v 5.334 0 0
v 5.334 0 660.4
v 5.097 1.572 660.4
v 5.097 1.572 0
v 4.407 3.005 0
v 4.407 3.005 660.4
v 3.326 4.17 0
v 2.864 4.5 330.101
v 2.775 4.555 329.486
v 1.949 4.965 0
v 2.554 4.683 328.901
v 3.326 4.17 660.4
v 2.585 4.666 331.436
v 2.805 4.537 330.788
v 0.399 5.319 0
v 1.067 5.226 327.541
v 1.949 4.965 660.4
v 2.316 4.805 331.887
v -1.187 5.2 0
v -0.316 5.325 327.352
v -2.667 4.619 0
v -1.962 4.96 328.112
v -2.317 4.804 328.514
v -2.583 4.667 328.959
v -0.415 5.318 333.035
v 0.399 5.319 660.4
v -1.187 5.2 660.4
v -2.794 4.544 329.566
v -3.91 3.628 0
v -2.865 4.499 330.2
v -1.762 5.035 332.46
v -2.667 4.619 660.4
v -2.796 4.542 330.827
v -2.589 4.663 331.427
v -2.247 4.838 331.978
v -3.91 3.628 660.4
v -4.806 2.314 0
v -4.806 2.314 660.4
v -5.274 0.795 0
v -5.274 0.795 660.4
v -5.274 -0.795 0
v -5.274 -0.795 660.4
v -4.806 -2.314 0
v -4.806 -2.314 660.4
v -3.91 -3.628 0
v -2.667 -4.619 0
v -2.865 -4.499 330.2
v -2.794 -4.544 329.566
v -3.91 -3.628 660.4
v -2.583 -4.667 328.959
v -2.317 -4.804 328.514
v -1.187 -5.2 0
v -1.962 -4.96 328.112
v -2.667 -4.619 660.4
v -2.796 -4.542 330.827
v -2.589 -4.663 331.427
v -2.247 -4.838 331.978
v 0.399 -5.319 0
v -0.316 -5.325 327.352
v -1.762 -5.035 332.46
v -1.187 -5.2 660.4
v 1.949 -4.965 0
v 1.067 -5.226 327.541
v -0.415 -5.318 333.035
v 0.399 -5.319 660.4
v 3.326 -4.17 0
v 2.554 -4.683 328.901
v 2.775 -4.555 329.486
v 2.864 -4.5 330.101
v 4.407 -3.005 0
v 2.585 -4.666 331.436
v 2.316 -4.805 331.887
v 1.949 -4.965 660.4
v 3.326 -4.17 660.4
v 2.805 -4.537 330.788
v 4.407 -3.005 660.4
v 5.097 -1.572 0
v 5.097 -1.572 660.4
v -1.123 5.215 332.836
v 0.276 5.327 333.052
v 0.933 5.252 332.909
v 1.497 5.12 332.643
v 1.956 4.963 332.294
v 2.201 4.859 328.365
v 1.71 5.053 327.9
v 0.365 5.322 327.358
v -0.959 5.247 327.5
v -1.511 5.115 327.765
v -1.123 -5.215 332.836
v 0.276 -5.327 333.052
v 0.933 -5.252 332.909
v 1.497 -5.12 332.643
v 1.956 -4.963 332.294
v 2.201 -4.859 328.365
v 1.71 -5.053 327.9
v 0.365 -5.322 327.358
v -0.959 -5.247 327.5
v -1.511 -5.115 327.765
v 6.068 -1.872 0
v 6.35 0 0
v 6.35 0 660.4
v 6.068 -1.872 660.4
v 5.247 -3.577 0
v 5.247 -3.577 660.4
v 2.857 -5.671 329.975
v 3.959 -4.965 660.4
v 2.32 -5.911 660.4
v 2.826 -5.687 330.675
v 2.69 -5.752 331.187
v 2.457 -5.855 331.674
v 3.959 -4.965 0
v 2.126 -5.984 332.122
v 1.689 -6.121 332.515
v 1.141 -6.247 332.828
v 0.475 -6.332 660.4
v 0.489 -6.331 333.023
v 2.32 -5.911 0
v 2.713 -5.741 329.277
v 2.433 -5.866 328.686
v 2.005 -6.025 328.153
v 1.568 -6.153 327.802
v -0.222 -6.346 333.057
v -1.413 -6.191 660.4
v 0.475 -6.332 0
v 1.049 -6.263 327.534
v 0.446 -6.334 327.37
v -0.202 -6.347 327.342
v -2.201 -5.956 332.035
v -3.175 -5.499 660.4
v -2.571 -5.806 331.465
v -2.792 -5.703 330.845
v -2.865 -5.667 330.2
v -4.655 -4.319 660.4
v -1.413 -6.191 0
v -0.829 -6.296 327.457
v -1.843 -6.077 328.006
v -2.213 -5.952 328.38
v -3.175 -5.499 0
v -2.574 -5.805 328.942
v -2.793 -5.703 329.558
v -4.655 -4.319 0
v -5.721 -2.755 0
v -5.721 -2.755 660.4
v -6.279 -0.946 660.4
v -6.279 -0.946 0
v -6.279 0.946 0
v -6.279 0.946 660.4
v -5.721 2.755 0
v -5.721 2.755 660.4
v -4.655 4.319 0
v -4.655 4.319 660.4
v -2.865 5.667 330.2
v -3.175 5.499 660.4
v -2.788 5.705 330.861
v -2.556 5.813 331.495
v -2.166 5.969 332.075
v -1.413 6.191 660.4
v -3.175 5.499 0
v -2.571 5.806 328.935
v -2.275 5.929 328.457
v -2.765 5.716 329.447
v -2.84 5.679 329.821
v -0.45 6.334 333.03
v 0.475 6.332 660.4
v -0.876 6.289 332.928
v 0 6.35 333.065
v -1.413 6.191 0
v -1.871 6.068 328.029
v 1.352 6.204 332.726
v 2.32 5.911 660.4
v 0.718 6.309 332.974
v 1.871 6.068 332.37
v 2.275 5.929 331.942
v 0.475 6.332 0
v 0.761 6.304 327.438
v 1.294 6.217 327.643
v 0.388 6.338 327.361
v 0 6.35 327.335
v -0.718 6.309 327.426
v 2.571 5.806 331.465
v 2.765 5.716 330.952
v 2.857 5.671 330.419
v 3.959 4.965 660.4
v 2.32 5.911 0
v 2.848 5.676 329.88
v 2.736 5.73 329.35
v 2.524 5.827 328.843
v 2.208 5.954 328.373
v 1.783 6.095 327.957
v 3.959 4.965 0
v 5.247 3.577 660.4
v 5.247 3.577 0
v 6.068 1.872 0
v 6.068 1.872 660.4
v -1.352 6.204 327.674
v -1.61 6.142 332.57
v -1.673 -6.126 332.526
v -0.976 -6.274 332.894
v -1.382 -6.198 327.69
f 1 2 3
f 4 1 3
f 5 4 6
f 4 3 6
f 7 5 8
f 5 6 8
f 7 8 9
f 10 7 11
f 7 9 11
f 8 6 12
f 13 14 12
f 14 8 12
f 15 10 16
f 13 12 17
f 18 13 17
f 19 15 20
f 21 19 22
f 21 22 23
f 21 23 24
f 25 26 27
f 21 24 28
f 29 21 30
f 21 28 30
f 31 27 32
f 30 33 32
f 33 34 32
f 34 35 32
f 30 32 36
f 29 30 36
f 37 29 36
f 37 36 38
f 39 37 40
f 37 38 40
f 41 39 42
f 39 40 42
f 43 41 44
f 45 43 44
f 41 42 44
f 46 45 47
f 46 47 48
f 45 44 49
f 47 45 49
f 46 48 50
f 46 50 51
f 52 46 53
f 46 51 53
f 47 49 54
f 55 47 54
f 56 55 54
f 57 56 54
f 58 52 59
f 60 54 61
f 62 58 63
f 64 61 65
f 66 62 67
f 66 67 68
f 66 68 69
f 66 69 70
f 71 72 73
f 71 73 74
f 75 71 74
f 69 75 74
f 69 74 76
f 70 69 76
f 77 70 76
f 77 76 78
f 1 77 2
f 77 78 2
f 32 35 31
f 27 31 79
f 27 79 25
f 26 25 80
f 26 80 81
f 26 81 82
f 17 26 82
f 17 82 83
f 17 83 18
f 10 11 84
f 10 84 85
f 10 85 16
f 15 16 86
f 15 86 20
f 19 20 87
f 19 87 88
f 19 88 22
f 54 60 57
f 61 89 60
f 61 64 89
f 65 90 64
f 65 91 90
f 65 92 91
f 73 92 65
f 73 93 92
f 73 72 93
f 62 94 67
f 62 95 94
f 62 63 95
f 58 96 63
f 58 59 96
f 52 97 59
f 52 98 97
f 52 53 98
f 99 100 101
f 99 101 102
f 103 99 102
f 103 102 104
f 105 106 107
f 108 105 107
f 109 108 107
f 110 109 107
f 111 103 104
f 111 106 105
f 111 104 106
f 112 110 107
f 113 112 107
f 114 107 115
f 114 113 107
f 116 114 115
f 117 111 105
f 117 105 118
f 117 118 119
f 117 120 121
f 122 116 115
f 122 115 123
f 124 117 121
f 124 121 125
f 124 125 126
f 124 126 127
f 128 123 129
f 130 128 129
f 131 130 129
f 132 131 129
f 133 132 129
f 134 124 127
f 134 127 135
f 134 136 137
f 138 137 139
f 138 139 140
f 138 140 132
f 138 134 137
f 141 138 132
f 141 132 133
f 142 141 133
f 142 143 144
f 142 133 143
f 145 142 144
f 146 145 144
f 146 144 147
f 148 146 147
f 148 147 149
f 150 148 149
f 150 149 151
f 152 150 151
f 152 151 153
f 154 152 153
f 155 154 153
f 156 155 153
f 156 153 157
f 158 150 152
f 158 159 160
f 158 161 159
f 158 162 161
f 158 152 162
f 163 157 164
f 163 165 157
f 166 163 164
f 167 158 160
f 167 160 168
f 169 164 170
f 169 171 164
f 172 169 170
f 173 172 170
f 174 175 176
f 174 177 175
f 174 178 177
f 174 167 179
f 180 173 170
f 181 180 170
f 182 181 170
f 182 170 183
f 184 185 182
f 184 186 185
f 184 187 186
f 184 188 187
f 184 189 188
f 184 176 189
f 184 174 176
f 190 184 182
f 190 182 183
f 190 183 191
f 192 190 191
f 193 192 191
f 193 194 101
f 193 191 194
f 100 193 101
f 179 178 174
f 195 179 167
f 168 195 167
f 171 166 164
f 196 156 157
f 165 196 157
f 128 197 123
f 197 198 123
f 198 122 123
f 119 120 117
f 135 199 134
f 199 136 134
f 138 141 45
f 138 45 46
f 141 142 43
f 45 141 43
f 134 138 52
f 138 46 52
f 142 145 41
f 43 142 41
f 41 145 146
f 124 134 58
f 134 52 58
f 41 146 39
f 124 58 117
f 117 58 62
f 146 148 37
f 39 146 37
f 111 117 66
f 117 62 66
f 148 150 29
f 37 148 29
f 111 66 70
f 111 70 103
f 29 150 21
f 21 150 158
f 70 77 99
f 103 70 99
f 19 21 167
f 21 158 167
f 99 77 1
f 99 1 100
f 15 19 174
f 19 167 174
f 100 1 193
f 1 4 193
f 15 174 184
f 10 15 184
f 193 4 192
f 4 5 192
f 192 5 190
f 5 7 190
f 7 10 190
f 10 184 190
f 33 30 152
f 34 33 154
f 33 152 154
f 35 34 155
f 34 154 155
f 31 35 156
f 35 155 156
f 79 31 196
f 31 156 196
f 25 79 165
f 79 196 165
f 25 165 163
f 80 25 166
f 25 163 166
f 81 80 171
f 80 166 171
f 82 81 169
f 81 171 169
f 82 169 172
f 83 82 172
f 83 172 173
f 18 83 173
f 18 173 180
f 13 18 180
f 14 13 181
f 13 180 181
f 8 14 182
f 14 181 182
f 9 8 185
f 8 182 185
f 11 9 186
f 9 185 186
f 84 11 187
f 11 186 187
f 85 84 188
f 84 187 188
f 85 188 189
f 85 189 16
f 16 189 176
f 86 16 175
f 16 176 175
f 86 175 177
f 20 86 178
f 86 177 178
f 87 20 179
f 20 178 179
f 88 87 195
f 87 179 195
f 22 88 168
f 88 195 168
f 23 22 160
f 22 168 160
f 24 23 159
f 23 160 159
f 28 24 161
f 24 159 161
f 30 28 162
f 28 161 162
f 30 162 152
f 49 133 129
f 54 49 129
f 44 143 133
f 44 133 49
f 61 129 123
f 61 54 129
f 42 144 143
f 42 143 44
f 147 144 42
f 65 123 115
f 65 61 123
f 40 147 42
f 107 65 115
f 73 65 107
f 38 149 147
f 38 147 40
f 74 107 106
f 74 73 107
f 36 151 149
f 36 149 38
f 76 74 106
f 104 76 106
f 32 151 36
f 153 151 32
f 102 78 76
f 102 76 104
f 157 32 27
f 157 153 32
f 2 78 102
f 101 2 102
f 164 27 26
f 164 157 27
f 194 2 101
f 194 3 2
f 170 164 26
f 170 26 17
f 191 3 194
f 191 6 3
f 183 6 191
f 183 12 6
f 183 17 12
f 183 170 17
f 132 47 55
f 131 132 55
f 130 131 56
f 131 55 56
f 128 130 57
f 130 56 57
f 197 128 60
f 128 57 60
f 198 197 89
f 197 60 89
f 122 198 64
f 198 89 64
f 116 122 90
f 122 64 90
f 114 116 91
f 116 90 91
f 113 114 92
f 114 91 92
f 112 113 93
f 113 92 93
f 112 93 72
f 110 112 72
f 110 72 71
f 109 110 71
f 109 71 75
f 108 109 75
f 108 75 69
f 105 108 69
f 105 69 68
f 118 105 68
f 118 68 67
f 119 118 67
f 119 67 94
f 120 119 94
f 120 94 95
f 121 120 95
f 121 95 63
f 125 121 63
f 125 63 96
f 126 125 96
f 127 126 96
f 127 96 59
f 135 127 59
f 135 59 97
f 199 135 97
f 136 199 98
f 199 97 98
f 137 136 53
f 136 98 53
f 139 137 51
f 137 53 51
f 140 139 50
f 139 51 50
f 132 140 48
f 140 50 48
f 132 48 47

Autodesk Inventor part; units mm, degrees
ref_plane "YZ Plane" through (0, 0, 0) normal (1, 0, 0) x (0, 1, 0)
ref_plane "XY Plane" through (0, 0, 0) normal (0, 0, 1) x (1, 0, 0)
sketch "Sketch1" plane through (0, 0, 0) normal (0, 0, 1) x (1, 0, 0)
  circle A0 centre (0, 0) radius 6.35
  dimension "d0" = 12.7
extrude "Extrusion1" add sketch "Sketch1" along normal blind 660.4
sketch "Sketch2" plane through (0, 0, 660.4) normal (0, 0, 1) x (1, 0, 0)
  circle A0 centre (0, 0) radius 5.334
  dimension "d3" = 10.668
extrude "Extrusion2" cut sketch "Sketch2" against normal blind 660.4
ref_plane "Work Plane1" through (0, 6.35, 0) normal (0, 1, 0) x (-1, 0, 0)
sketch "Sketch3" plane through (0, 6.35, 0) normal (0, 1, 0) x (-1, 0, 0)
  circle A0 centre (0, 330.2) radius 2.8654
  point P0 (0, 0)
  dimension "d6" = 330.2
extrude "Extrusion3" cut sketch "Sketch3" against normal through all
properties part number "horizontal support"
